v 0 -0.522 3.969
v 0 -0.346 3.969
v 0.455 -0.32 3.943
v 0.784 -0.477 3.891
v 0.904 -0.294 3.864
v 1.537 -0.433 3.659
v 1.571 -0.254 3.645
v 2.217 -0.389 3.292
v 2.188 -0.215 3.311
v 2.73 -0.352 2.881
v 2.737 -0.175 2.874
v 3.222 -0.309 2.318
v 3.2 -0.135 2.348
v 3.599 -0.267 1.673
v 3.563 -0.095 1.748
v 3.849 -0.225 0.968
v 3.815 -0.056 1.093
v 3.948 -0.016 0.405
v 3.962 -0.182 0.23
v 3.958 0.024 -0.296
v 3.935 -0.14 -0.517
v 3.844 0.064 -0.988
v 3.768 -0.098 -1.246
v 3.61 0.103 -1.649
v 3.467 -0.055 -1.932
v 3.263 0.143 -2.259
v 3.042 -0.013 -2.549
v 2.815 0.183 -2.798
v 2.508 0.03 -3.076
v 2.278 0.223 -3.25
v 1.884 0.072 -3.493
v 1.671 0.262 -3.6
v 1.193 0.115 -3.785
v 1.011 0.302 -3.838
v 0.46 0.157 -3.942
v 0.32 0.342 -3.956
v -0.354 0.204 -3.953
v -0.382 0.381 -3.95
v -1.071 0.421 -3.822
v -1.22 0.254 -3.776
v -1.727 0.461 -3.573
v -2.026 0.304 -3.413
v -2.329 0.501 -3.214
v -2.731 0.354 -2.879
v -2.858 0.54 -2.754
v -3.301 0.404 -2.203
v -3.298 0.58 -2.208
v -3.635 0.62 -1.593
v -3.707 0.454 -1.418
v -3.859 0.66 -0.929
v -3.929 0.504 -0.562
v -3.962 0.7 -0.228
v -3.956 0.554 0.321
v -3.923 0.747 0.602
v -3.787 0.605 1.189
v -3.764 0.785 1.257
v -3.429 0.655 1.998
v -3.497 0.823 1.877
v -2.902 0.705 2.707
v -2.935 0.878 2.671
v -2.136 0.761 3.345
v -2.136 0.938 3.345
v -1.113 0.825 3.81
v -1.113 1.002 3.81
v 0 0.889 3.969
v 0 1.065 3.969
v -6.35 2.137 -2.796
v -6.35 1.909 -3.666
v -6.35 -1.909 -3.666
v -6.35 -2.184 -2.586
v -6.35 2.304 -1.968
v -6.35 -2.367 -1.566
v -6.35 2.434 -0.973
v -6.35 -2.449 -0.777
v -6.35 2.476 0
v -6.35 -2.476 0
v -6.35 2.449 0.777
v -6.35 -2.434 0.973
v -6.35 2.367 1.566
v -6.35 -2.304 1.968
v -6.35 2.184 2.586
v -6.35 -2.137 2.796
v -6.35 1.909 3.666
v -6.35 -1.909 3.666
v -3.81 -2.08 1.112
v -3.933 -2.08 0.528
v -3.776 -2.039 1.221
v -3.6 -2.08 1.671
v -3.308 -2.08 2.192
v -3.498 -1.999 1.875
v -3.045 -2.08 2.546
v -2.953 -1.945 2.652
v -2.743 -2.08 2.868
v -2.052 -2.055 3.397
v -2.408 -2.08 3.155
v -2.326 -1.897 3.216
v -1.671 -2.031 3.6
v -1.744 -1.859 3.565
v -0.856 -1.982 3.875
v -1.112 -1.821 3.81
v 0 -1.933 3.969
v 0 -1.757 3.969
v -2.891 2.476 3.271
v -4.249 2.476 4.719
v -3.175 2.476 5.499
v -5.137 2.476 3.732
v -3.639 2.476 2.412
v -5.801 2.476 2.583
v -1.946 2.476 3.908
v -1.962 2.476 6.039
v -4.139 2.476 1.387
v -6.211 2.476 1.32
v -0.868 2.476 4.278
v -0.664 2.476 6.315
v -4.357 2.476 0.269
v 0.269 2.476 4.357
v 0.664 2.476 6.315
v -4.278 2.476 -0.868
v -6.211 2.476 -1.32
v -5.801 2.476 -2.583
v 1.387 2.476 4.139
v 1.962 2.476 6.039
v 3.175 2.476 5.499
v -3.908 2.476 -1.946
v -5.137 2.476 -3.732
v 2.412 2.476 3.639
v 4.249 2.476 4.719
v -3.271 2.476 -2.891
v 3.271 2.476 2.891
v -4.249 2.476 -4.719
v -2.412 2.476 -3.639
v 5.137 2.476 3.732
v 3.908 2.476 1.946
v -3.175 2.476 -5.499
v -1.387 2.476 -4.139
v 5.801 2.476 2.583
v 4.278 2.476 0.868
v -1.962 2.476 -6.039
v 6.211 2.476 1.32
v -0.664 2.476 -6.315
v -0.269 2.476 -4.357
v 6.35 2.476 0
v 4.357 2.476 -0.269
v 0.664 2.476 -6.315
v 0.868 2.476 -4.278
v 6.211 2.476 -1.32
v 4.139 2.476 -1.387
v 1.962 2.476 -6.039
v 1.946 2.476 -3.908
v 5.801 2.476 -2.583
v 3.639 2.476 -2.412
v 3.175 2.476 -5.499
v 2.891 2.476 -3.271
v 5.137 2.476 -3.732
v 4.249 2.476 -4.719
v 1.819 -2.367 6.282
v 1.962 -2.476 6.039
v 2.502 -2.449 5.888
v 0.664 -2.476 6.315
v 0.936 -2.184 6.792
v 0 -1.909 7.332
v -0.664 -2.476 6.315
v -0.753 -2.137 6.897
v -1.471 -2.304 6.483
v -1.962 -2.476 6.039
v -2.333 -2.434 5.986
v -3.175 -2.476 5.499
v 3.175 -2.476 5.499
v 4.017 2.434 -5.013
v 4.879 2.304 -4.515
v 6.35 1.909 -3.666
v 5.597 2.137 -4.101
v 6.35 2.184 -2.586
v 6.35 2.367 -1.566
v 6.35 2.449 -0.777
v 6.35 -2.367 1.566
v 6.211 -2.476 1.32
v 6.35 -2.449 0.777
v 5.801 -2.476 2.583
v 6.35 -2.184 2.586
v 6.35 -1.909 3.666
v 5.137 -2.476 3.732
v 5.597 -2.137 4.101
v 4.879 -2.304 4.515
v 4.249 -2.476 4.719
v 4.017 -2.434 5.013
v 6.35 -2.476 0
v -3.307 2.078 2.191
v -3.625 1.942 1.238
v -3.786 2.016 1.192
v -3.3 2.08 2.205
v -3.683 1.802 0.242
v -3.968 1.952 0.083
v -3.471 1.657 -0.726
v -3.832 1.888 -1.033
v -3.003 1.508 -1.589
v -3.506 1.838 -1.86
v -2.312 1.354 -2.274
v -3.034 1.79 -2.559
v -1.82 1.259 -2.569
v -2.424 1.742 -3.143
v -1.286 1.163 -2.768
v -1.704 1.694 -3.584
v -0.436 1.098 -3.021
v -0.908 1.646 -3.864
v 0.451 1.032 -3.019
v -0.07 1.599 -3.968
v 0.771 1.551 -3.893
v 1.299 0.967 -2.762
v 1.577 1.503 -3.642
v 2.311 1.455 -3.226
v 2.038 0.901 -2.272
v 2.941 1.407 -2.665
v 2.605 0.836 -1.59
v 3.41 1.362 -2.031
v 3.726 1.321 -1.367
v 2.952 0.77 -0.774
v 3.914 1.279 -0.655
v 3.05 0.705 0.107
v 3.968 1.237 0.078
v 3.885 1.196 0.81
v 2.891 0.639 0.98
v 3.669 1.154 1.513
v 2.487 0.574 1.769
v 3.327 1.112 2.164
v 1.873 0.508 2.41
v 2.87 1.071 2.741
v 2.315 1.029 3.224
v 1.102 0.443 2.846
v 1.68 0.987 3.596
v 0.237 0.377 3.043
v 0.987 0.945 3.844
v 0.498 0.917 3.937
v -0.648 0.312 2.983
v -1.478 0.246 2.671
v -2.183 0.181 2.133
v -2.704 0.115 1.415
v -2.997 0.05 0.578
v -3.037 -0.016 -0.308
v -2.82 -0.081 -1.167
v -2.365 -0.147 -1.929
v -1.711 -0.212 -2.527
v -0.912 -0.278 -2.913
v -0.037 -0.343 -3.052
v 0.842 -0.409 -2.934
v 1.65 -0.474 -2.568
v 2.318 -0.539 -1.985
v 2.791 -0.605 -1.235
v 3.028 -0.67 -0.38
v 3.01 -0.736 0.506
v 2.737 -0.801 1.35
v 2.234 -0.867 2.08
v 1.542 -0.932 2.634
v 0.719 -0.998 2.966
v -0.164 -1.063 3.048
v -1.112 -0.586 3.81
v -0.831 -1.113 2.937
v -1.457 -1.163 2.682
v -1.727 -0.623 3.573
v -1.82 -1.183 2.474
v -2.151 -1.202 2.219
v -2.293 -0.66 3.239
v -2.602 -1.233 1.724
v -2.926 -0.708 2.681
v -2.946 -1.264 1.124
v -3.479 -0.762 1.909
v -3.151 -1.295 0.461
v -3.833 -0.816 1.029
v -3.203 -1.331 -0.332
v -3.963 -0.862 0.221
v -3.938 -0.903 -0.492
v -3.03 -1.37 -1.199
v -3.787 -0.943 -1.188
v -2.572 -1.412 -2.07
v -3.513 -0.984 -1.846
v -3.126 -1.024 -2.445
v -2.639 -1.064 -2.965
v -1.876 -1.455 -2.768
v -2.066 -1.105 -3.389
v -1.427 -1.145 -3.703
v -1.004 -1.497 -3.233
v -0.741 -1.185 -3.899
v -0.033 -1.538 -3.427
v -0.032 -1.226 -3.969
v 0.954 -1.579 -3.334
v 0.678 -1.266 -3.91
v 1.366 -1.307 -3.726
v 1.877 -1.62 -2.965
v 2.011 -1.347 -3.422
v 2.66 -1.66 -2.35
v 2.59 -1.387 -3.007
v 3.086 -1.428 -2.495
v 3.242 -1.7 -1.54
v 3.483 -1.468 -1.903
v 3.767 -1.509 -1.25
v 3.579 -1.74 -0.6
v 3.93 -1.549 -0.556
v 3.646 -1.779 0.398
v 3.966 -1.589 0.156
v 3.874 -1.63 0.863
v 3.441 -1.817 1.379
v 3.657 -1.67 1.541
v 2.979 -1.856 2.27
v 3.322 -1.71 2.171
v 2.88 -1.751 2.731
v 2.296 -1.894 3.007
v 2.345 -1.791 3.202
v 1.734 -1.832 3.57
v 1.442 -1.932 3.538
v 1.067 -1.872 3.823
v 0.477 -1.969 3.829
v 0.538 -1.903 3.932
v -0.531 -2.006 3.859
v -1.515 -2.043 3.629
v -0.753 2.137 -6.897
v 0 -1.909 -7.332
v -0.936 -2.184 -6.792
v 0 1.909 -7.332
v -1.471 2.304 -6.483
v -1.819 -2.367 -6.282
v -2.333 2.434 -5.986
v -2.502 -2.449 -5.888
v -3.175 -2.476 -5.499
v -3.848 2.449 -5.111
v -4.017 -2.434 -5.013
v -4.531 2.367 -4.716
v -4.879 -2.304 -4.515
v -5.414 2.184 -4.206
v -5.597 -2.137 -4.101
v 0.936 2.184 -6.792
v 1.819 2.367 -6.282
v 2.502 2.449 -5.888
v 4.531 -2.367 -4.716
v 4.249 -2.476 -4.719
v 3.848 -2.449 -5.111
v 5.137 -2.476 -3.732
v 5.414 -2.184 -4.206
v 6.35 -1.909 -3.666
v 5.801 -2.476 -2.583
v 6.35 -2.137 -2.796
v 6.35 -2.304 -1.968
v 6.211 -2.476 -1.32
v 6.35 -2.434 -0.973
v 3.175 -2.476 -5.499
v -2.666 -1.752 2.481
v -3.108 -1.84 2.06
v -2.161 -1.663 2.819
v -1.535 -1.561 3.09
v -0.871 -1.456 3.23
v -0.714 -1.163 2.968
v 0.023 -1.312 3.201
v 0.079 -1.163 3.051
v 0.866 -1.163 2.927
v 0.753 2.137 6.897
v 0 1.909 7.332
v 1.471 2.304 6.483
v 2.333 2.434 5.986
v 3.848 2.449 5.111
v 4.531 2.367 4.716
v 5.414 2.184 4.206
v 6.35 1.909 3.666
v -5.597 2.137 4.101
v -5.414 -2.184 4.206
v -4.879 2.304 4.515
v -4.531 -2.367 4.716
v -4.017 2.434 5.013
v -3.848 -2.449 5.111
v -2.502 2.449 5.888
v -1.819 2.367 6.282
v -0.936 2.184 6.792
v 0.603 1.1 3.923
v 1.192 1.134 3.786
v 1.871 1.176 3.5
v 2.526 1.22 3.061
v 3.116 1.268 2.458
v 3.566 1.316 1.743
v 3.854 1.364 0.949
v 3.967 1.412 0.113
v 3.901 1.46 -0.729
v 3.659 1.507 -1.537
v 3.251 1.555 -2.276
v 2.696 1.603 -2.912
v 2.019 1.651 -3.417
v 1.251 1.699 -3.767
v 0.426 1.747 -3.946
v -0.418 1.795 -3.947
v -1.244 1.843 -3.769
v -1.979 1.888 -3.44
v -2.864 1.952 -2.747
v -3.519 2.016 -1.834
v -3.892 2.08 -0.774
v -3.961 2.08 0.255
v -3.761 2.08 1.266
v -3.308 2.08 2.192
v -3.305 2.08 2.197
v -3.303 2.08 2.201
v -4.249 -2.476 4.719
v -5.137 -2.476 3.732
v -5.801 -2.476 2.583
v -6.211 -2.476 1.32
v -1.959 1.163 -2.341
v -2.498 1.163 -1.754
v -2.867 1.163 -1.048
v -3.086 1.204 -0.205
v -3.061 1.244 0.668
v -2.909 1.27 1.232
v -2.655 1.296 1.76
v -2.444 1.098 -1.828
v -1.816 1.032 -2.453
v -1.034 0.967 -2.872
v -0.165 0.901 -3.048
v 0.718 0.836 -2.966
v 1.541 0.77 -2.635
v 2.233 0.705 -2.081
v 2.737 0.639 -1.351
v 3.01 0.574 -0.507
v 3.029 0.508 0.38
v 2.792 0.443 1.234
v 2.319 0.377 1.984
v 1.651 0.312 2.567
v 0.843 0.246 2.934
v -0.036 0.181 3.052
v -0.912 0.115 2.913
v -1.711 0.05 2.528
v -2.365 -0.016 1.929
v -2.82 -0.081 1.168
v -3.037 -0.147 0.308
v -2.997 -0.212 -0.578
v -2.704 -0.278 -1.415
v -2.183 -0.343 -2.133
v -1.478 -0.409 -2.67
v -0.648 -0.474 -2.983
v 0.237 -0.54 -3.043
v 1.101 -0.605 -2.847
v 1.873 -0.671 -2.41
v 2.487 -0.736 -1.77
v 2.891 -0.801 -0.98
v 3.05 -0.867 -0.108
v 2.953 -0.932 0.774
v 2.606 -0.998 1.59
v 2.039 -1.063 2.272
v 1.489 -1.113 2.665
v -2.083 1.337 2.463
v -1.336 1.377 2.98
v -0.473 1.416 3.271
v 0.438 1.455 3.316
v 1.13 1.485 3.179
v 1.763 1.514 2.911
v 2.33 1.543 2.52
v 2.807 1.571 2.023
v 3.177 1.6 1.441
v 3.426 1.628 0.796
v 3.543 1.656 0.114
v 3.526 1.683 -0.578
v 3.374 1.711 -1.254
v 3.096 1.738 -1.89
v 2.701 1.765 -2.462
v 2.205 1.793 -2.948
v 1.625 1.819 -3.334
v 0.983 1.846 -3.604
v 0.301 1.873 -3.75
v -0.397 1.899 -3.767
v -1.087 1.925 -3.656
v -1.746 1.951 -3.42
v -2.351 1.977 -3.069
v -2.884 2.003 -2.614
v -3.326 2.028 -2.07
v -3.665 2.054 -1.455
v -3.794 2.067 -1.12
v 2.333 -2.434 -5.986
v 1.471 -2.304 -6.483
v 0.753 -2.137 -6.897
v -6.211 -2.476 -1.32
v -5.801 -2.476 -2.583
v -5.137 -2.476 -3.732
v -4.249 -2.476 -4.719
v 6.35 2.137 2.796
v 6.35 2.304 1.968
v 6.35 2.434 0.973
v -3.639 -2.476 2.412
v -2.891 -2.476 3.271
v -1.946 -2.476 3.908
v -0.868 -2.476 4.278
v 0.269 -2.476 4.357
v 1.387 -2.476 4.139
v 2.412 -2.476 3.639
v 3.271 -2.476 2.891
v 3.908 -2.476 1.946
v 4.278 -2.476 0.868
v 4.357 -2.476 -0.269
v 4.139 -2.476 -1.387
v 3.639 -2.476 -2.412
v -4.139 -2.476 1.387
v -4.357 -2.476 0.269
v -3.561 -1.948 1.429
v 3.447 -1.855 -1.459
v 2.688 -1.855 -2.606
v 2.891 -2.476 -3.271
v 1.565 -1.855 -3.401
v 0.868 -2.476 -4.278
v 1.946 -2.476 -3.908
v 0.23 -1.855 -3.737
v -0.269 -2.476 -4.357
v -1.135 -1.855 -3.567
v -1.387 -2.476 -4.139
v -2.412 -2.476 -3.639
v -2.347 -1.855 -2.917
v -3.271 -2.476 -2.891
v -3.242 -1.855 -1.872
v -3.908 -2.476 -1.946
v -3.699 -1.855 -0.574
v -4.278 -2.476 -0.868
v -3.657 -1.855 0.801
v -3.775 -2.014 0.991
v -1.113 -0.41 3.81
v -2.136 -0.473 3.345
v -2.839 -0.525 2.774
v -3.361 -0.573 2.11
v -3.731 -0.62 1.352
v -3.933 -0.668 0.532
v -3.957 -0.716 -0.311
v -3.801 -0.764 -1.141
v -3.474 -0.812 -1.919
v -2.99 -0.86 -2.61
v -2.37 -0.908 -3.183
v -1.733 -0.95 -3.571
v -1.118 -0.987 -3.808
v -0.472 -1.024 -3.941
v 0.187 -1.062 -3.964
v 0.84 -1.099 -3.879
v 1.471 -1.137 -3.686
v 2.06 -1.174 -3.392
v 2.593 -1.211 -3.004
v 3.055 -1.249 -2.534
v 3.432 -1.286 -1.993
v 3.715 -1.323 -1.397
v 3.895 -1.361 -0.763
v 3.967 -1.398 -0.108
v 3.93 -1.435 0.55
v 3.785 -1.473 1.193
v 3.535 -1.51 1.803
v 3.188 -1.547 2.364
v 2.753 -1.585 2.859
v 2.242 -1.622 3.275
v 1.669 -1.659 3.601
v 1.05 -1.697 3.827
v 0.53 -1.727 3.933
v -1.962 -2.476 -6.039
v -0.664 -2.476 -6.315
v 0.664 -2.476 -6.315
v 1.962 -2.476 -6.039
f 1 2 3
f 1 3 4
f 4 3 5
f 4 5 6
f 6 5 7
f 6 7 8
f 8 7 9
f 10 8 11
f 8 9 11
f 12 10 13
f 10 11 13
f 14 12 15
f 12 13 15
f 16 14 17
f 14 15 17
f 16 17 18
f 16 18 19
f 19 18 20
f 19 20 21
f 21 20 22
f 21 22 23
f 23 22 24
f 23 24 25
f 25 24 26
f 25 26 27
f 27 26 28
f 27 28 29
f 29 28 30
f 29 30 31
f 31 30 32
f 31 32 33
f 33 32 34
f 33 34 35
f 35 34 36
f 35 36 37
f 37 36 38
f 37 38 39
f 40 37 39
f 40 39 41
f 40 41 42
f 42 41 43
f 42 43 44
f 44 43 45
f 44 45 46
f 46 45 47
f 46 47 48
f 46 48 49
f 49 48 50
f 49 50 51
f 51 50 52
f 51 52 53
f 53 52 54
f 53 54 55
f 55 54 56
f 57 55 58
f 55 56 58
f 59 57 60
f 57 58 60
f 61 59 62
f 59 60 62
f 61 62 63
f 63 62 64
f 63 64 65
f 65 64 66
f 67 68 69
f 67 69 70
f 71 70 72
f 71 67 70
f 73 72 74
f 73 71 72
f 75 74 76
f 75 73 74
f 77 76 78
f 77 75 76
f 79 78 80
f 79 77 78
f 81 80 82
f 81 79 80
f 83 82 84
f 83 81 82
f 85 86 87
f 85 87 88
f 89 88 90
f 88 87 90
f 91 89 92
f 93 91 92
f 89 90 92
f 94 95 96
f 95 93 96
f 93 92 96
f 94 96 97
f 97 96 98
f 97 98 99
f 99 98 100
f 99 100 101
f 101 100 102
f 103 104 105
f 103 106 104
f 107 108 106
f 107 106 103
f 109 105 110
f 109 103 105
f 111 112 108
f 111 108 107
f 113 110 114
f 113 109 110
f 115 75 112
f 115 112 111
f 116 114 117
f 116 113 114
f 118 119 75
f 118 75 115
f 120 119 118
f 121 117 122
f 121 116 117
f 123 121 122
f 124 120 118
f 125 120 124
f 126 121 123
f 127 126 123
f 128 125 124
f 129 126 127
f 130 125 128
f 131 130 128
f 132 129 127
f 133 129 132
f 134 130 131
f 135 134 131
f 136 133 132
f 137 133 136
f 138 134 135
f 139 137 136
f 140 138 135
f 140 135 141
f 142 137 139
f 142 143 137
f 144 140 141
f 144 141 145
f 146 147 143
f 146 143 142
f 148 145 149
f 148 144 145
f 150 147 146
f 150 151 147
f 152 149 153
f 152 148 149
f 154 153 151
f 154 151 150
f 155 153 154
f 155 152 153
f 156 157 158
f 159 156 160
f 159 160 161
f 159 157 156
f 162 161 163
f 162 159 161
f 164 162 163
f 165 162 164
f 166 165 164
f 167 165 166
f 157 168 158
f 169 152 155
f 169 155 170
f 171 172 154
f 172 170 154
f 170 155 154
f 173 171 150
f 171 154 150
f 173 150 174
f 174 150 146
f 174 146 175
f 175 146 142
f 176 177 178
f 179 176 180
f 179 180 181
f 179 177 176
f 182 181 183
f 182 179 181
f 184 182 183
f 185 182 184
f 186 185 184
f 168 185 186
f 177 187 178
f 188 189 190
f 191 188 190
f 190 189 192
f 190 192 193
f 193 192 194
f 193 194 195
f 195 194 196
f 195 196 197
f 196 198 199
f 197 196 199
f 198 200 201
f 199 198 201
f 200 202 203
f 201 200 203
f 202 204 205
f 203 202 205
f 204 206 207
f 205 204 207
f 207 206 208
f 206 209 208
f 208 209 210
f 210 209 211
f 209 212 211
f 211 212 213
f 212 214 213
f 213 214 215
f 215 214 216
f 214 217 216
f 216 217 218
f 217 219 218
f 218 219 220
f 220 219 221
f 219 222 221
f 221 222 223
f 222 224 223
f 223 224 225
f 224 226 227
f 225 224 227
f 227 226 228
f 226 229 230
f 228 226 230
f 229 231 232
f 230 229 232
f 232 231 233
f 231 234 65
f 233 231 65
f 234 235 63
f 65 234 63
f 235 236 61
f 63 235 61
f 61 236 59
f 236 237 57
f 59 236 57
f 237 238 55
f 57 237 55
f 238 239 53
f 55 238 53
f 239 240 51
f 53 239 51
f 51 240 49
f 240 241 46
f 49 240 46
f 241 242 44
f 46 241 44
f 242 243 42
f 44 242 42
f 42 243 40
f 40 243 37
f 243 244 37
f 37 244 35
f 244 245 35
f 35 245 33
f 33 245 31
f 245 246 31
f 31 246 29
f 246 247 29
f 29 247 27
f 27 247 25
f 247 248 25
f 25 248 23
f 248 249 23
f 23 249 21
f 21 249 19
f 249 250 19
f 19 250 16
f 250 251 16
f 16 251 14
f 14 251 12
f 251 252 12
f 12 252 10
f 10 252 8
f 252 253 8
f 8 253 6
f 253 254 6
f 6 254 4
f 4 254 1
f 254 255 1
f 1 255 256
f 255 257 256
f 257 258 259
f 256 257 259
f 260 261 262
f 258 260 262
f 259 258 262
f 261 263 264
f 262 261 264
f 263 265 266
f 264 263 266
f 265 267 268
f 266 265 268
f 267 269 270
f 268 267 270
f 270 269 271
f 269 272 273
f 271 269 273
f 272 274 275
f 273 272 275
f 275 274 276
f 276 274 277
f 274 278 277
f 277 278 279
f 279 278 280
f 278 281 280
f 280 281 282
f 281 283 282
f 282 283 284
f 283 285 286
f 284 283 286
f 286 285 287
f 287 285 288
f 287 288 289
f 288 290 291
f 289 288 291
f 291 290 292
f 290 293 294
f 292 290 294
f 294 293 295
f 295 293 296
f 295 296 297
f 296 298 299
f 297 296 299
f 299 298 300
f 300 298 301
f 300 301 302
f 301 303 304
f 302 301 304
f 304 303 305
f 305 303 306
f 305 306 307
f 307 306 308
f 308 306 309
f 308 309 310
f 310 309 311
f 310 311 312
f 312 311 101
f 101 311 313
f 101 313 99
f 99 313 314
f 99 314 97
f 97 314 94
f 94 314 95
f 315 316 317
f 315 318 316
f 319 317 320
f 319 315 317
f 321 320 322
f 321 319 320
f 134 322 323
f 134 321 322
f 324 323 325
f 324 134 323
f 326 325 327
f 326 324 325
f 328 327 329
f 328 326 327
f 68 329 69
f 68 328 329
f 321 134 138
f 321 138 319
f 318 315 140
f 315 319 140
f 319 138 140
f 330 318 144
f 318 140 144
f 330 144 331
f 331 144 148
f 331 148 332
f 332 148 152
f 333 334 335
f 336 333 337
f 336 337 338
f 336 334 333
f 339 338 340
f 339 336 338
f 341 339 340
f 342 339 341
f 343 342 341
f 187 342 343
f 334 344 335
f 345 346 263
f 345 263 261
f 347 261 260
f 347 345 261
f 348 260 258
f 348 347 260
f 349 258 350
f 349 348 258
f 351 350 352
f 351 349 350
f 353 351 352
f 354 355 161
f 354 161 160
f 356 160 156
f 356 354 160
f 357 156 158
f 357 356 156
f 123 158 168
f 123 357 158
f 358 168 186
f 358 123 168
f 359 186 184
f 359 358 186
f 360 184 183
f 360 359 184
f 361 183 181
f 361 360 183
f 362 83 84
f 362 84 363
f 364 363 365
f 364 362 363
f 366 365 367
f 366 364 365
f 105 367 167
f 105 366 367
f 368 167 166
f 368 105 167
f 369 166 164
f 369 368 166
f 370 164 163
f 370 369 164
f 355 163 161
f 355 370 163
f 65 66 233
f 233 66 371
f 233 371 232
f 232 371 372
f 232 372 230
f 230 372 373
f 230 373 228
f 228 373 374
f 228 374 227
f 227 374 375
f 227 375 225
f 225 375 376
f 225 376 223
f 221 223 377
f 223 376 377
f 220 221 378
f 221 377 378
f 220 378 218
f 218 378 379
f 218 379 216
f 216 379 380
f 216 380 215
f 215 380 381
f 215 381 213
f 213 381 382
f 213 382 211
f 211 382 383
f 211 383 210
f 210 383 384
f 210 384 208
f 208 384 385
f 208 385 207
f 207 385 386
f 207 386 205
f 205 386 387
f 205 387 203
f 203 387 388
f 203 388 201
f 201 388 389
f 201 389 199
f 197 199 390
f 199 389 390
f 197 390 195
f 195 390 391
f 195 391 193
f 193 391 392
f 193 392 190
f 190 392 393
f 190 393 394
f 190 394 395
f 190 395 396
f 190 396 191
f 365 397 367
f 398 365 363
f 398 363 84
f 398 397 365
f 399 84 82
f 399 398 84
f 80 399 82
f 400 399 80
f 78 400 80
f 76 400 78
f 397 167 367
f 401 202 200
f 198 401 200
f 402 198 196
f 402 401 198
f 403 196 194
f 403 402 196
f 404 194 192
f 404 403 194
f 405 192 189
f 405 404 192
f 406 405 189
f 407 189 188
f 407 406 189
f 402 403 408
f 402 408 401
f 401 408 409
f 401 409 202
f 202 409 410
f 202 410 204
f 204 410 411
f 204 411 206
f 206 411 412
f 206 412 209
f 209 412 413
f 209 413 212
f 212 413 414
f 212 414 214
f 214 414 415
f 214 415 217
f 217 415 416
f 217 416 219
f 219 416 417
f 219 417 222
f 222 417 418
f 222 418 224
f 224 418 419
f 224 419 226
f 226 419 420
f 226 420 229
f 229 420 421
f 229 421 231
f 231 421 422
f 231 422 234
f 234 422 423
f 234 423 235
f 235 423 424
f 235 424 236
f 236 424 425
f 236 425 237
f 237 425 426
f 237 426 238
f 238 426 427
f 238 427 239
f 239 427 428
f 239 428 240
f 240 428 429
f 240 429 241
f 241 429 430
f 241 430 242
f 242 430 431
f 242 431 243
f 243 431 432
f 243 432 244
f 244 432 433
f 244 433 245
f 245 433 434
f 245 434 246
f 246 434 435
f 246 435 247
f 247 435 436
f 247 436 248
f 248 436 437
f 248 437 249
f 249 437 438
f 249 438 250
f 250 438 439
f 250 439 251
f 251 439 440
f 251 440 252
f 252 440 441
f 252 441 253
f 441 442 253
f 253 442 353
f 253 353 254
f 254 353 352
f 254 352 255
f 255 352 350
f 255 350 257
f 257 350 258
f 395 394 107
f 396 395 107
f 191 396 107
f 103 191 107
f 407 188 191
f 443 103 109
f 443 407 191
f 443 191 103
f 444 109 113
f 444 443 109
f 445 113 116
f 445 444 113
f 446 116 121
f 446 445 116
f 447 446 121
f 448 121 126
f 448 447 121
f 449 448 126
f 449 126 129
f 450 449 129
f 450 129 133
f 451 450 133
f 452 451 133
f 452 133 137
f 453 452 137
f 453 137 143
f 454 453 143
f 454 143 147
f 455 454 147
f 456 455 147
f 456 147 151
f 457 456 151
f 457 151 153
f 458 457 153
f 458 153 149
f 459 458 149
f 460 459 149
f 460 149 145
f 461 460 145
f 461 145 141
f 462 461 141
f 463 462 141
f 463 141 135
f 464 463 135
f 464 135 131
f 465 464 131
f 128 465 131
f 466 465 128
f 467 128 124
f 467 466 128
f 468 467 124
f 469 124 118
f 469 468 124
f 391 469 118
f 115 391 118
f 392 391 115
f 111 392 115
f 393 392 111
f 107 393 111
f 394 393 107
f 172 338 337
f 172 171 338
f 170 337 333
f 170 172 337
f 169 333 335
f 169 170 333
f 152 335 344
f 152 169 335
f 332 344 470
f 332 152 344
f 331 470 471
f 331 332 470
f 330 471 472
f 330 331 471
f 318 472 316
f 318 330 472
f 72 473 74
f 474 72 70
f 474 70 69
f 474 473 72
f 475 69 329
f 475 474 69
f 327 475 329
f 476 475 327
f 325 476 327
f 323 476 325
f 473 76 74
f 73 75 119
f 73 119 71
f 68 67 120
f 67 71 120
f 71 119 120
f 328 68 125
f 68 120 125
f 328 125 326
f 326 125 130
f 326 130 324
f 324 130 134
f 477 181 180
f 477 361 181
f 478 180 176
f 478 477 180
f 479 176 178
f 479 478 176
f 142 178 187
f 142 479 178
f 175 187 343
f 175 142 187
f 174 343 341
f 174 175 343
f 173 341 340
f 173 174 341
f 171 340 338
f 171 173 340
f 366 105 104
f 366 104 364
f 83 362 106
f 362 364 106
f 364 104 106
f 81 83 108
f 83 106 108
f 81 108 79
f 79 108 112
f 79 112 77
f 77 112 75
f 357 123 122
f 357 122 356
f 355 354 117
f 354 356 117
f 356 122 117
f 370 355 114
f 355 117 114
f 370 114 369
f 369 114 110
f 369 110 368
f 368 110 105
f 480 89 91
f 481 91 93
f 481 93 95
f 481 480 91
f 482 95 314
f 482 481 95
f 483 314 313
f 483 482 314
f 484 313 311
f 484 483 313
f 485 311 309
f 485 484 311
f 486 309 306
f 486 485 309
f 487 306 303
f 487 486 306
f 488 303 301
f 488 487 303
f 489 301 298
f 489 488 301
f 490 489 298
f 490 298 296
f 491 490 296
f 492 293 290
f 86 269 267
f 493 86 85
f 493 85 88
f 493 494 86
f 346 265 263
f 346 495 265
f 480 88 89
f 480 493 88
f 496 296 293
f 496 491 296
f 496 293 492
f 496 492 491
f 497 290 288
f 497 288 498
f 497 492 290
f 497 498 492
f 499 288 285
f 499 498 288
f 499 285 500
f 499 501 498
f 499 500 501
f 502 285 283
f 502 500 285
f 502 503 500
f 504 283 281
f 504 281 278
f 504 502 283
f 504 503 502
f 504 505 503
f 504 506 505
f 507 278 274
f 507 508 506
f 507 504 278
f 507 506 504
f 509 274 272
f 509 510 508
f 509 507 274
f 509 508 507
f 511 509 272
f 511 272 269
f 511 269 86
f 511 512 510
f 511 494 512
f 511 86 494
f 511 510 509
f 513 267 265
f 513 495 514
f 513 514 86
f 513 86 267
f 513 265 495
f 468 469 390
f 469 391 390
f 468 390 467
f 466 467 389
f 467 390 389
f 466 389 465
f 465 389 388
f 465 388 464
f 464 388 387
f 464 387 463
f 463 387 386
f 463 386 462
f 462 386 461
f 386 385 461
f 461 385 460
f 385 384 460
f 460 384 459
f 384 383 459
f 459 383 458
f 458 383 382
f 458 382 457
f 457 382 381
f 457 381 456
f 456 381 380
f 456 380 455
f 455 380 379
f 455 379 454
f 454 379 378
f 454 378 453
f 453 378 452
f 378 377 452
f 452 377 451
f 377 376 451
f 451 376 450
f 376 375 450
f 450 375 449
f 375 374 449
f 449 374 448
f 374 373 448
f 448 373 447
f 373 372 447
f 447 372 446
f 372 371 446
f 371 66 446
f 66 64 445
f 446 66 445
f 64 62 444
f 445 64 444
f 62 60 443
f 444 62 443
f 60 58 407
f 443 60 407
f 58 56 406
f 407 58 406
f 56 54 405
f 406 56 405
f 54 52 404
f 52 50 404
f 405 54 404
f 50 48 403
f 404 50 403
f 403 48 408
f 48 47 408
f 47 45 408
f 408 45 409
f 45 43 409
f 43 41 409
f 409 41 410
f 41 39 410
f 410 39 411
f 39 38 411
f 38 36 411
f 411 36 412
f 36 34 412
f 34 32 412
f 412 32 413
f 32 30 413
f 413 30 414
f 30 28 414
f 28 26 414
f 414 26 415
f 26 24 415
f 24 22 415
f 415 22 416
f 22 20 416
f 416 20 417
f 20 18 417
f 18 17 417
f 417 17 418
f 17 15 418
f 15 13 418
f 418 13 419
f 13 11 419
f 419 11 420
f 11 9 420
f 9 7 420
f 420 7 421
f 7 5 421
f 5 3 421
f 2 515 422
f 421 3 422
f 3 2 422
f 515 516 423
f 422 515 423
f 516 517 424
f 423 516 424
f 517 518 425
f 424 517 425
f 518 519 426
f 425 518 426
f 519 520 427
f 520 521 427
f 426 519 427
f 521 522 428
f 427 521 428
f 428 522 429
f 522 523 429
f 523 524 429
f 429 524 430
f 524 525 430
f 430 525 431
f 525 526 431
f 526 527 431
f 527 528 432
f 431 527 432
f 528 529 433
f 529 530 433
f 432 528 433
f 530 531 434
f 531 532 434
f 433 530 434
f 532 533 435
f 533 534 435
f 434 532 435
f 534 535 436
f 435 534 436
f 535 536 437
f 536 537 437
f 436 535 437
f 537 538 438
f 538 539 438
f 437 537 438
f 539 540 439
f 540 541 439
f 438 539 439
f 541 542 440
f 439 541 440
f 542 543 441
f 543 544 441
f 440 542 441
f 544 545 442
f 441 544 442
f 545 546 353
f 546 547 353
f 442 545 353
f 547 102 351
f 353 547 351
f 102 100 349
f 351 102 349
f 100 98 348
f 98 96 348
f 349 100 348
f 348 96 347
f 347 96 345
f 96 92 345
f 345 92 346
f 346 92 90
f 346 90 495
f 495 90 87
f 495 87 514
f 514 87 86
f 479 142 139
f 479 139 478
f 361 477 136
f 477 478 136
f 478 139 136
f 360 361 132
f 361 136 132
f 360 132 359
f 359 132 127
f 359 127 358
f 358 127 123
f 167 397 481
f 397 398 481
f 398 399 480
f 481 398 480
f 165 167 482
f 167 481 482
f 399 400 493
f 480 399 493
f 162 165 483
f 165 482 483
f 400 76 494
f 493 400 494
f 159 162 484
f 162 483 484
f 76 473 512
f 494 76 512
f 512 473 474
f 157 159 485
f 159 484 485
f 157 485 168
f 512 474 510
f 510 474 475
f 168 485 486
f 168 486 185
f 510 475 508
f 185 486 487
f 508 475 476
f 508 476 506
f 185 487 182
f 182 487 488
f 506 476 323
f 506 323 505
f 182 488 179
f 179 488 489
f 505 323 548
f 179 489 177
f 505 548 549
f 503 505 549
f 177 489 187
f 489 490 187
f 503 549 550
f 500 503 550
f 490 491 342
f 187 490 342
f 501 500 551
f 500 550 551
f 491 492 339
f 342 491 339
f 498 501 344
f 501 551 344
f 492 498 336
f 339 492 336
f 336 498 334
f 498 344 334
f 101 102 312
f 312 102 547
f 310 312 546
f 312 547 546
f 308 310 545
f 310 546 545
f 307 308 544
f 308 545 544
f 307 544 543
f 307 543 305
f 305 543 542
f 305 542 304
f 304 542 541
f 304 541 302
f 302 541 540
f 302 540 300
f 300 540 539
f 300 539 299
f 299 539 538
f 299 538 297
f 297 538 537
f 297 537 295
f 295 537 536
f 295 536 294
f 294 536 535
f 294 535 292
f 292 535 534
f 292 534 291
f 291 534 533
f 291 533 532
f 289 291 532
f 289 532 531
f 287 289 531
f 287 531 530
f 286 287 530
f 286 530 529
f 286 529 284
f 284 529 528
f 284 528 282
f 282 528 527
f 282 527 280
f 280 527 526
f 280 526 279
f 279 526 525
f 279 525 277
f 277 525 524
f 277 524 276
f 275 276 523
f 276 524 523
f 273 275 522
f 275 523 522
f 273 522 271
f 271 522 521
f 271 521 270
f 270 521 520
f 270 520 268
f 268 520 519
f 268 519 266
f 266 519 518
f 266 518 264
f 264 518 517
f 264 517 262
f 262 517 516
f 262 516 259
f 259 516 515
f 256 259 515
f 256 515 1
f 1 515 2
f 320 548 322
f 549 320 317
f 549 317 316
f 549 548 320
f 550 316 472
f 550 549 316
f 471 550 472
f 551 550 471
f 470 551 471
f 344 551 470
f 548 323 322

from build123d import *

# Parameters (mm, degrees)
SKETCH2_R                = 3.96875
BOSS_EXTRUDE1_DEPTH      = 2.4765
BOSS_EXTRUDE1_DEPTH_BACK = 2.4765
SKETCH4_R                = 3.96875
BOSS_EXTRUDE2_DEPTH      = 4.953
CUT_SWEEP1_PITCH         = 1.411111111
CUT_SWEEP1_HEIGHT        = 6.364111111
CUT_SWEEP1_RADIUS        = 3.96875
CUT_SWEEP1_START_ANGLE   = 180
SKETCH8_R                = 4.365625
BOSS_EXTRUDE3_DEPTH      = 4.953


with BuildPart() as part:
    # Sketch2 → Boss-Extrude1 (new, two sides)
    with BuildSketch(Plane(origin=(0, 0, 0), x_dir=(1, 0, 0), z_dir=(0, 1, 0))) as boss_extrude1_sk:
        Polygon((0, 7.332348419), (-6.35, 3.666174209), (-6.35, -3.666174209), (0, -7.332348419), (6.35, -3.666174209), (6.35, 3.666174209), align=None)
        with Locations(Location((0, 0, 0), (0, 0, 270))):
            Circle(SKETCH2_R, mode=Mode.SUBTRACT)
    extrude(amount=BOSS_EXTRUDE1_DEPTH)
    extrude(boss_extrude1_sk.sketch, amount=-BOSS_EXTRUDE1_DEPTH_BACK)

    # Sketch3 → Cut-Revolve1 (revolve, cut)
    with BuildSketch(Plane(origin=(0, 0, 0), x_dir=(0, 0, -1), z_dir=(1, 0, 0))):
        Polygon((-7.332348419, 1.909340876), (-6.35, 2.4765), (-7.332348419, 2.4765), align=None)
        Polygon((-7.332348419, -1.909340876), (-6.35, -2.4765), (-7.332348419, -2.4765), align=None)
        Polygon((-4.365625, 2.4765), (-3.96875, 2.4765), (-3.96875, 2.079625), align=None)
        Polygon((-4.365625, -2.4765), (-3.96875, -2.4765), (-3.96875, -2.079625), align=None)
    revolve(axis=Axis((0, 2.4765, 0), (0, -1, 0)), mode=Mode.SUBTRACT)

    # Sketch8 → Boss-Extrude3 (add)
    with BuildSketch(Plane(origin=(0, 2.4765, 0), x_dir=(1, 0, 0), z_dir=(0, 1, 0))):
        Circle(SKETCH8_R)
    extrude(amount=-BOSS_EXTRUDE3_DEPTH)


with BuildPart() as body_2:
    # Sketch4 → Boss-Extrude2 (new body)
    with BuildSketch(Plane(origin=(0, 2.4765, 0), x_dir=(1, 0, 0), z_dir=(0, 1, 0))):
        with Locations(Location((0, 0, 0), (0, 0, 270))):
            Circle(SKETCH4_R)
    extrude(amount=-BOSS_EXTRUDE2_DEPTH)

    # Cut-Sweep1: sweep along a helix
    with BuildLine() as cut_sweep1_path:
        add(Helix(CUT_SWEEP1_PITCH, CUT_SWEEP1_HEIGHT, CUT_SWEEP1_RADIUS, center=(0, 2.4765, 0), direction=(0, -1, 0), mode=Mode.PRIVATE).rotate(Axis((0, 2.4765, 0), (0, -1, 0)), CUT_SWEEP1_START_ANGLE))
    # Sketch6 → Cut-Sweep1 (sweep, cut)
    with BuildSketch(Plane(origin=(0, 0, 0), x_dir=(0, 0, -1), z_dir=(1, 0, 0))):
        Polygon((-4.045128629, 2.432402778), (-4.045128629, 3.755319444), (-3.052206448, 3.182055556), (-3.052206448, 3.005666667), align=None)
    sweep(path=cut_sweep1_path.line, is_frenet=True, mode=Mode.SUBTRACT)

    # Sketch7 → Revolve1 (revolve)
    with BuildSketch(Plane(origin=(0, 0, 0), x_dir=(0, 0, -1), z_dir=(1, 0, 0)), mode=Mode.PRIVATE) as revolve1_sk:
        Polygon((-4.365625, 2.4765), (-2.38125, 0.492125), (0, 0.492125), (0, 2.4765), align=None)
        Polygon((-4.365625, -2.4765), (0, -2.4765), (0, -0.492125), (-2.38125, -0.492125), align=None)
    revolve(revolve1_sk.sketch.rotate(Axis((0, -2.4765, 0), (0, 1, 0)), 303.531095579), axis=Axis((0, -2.4765, 0), (0, 1, 0)))


with BuildPart() as part_1:
    add(part.part)

    # Combine1: cut body 2
    add(body_2.part, mode=Mode.SUBTRACT)


solid = part_1.part
